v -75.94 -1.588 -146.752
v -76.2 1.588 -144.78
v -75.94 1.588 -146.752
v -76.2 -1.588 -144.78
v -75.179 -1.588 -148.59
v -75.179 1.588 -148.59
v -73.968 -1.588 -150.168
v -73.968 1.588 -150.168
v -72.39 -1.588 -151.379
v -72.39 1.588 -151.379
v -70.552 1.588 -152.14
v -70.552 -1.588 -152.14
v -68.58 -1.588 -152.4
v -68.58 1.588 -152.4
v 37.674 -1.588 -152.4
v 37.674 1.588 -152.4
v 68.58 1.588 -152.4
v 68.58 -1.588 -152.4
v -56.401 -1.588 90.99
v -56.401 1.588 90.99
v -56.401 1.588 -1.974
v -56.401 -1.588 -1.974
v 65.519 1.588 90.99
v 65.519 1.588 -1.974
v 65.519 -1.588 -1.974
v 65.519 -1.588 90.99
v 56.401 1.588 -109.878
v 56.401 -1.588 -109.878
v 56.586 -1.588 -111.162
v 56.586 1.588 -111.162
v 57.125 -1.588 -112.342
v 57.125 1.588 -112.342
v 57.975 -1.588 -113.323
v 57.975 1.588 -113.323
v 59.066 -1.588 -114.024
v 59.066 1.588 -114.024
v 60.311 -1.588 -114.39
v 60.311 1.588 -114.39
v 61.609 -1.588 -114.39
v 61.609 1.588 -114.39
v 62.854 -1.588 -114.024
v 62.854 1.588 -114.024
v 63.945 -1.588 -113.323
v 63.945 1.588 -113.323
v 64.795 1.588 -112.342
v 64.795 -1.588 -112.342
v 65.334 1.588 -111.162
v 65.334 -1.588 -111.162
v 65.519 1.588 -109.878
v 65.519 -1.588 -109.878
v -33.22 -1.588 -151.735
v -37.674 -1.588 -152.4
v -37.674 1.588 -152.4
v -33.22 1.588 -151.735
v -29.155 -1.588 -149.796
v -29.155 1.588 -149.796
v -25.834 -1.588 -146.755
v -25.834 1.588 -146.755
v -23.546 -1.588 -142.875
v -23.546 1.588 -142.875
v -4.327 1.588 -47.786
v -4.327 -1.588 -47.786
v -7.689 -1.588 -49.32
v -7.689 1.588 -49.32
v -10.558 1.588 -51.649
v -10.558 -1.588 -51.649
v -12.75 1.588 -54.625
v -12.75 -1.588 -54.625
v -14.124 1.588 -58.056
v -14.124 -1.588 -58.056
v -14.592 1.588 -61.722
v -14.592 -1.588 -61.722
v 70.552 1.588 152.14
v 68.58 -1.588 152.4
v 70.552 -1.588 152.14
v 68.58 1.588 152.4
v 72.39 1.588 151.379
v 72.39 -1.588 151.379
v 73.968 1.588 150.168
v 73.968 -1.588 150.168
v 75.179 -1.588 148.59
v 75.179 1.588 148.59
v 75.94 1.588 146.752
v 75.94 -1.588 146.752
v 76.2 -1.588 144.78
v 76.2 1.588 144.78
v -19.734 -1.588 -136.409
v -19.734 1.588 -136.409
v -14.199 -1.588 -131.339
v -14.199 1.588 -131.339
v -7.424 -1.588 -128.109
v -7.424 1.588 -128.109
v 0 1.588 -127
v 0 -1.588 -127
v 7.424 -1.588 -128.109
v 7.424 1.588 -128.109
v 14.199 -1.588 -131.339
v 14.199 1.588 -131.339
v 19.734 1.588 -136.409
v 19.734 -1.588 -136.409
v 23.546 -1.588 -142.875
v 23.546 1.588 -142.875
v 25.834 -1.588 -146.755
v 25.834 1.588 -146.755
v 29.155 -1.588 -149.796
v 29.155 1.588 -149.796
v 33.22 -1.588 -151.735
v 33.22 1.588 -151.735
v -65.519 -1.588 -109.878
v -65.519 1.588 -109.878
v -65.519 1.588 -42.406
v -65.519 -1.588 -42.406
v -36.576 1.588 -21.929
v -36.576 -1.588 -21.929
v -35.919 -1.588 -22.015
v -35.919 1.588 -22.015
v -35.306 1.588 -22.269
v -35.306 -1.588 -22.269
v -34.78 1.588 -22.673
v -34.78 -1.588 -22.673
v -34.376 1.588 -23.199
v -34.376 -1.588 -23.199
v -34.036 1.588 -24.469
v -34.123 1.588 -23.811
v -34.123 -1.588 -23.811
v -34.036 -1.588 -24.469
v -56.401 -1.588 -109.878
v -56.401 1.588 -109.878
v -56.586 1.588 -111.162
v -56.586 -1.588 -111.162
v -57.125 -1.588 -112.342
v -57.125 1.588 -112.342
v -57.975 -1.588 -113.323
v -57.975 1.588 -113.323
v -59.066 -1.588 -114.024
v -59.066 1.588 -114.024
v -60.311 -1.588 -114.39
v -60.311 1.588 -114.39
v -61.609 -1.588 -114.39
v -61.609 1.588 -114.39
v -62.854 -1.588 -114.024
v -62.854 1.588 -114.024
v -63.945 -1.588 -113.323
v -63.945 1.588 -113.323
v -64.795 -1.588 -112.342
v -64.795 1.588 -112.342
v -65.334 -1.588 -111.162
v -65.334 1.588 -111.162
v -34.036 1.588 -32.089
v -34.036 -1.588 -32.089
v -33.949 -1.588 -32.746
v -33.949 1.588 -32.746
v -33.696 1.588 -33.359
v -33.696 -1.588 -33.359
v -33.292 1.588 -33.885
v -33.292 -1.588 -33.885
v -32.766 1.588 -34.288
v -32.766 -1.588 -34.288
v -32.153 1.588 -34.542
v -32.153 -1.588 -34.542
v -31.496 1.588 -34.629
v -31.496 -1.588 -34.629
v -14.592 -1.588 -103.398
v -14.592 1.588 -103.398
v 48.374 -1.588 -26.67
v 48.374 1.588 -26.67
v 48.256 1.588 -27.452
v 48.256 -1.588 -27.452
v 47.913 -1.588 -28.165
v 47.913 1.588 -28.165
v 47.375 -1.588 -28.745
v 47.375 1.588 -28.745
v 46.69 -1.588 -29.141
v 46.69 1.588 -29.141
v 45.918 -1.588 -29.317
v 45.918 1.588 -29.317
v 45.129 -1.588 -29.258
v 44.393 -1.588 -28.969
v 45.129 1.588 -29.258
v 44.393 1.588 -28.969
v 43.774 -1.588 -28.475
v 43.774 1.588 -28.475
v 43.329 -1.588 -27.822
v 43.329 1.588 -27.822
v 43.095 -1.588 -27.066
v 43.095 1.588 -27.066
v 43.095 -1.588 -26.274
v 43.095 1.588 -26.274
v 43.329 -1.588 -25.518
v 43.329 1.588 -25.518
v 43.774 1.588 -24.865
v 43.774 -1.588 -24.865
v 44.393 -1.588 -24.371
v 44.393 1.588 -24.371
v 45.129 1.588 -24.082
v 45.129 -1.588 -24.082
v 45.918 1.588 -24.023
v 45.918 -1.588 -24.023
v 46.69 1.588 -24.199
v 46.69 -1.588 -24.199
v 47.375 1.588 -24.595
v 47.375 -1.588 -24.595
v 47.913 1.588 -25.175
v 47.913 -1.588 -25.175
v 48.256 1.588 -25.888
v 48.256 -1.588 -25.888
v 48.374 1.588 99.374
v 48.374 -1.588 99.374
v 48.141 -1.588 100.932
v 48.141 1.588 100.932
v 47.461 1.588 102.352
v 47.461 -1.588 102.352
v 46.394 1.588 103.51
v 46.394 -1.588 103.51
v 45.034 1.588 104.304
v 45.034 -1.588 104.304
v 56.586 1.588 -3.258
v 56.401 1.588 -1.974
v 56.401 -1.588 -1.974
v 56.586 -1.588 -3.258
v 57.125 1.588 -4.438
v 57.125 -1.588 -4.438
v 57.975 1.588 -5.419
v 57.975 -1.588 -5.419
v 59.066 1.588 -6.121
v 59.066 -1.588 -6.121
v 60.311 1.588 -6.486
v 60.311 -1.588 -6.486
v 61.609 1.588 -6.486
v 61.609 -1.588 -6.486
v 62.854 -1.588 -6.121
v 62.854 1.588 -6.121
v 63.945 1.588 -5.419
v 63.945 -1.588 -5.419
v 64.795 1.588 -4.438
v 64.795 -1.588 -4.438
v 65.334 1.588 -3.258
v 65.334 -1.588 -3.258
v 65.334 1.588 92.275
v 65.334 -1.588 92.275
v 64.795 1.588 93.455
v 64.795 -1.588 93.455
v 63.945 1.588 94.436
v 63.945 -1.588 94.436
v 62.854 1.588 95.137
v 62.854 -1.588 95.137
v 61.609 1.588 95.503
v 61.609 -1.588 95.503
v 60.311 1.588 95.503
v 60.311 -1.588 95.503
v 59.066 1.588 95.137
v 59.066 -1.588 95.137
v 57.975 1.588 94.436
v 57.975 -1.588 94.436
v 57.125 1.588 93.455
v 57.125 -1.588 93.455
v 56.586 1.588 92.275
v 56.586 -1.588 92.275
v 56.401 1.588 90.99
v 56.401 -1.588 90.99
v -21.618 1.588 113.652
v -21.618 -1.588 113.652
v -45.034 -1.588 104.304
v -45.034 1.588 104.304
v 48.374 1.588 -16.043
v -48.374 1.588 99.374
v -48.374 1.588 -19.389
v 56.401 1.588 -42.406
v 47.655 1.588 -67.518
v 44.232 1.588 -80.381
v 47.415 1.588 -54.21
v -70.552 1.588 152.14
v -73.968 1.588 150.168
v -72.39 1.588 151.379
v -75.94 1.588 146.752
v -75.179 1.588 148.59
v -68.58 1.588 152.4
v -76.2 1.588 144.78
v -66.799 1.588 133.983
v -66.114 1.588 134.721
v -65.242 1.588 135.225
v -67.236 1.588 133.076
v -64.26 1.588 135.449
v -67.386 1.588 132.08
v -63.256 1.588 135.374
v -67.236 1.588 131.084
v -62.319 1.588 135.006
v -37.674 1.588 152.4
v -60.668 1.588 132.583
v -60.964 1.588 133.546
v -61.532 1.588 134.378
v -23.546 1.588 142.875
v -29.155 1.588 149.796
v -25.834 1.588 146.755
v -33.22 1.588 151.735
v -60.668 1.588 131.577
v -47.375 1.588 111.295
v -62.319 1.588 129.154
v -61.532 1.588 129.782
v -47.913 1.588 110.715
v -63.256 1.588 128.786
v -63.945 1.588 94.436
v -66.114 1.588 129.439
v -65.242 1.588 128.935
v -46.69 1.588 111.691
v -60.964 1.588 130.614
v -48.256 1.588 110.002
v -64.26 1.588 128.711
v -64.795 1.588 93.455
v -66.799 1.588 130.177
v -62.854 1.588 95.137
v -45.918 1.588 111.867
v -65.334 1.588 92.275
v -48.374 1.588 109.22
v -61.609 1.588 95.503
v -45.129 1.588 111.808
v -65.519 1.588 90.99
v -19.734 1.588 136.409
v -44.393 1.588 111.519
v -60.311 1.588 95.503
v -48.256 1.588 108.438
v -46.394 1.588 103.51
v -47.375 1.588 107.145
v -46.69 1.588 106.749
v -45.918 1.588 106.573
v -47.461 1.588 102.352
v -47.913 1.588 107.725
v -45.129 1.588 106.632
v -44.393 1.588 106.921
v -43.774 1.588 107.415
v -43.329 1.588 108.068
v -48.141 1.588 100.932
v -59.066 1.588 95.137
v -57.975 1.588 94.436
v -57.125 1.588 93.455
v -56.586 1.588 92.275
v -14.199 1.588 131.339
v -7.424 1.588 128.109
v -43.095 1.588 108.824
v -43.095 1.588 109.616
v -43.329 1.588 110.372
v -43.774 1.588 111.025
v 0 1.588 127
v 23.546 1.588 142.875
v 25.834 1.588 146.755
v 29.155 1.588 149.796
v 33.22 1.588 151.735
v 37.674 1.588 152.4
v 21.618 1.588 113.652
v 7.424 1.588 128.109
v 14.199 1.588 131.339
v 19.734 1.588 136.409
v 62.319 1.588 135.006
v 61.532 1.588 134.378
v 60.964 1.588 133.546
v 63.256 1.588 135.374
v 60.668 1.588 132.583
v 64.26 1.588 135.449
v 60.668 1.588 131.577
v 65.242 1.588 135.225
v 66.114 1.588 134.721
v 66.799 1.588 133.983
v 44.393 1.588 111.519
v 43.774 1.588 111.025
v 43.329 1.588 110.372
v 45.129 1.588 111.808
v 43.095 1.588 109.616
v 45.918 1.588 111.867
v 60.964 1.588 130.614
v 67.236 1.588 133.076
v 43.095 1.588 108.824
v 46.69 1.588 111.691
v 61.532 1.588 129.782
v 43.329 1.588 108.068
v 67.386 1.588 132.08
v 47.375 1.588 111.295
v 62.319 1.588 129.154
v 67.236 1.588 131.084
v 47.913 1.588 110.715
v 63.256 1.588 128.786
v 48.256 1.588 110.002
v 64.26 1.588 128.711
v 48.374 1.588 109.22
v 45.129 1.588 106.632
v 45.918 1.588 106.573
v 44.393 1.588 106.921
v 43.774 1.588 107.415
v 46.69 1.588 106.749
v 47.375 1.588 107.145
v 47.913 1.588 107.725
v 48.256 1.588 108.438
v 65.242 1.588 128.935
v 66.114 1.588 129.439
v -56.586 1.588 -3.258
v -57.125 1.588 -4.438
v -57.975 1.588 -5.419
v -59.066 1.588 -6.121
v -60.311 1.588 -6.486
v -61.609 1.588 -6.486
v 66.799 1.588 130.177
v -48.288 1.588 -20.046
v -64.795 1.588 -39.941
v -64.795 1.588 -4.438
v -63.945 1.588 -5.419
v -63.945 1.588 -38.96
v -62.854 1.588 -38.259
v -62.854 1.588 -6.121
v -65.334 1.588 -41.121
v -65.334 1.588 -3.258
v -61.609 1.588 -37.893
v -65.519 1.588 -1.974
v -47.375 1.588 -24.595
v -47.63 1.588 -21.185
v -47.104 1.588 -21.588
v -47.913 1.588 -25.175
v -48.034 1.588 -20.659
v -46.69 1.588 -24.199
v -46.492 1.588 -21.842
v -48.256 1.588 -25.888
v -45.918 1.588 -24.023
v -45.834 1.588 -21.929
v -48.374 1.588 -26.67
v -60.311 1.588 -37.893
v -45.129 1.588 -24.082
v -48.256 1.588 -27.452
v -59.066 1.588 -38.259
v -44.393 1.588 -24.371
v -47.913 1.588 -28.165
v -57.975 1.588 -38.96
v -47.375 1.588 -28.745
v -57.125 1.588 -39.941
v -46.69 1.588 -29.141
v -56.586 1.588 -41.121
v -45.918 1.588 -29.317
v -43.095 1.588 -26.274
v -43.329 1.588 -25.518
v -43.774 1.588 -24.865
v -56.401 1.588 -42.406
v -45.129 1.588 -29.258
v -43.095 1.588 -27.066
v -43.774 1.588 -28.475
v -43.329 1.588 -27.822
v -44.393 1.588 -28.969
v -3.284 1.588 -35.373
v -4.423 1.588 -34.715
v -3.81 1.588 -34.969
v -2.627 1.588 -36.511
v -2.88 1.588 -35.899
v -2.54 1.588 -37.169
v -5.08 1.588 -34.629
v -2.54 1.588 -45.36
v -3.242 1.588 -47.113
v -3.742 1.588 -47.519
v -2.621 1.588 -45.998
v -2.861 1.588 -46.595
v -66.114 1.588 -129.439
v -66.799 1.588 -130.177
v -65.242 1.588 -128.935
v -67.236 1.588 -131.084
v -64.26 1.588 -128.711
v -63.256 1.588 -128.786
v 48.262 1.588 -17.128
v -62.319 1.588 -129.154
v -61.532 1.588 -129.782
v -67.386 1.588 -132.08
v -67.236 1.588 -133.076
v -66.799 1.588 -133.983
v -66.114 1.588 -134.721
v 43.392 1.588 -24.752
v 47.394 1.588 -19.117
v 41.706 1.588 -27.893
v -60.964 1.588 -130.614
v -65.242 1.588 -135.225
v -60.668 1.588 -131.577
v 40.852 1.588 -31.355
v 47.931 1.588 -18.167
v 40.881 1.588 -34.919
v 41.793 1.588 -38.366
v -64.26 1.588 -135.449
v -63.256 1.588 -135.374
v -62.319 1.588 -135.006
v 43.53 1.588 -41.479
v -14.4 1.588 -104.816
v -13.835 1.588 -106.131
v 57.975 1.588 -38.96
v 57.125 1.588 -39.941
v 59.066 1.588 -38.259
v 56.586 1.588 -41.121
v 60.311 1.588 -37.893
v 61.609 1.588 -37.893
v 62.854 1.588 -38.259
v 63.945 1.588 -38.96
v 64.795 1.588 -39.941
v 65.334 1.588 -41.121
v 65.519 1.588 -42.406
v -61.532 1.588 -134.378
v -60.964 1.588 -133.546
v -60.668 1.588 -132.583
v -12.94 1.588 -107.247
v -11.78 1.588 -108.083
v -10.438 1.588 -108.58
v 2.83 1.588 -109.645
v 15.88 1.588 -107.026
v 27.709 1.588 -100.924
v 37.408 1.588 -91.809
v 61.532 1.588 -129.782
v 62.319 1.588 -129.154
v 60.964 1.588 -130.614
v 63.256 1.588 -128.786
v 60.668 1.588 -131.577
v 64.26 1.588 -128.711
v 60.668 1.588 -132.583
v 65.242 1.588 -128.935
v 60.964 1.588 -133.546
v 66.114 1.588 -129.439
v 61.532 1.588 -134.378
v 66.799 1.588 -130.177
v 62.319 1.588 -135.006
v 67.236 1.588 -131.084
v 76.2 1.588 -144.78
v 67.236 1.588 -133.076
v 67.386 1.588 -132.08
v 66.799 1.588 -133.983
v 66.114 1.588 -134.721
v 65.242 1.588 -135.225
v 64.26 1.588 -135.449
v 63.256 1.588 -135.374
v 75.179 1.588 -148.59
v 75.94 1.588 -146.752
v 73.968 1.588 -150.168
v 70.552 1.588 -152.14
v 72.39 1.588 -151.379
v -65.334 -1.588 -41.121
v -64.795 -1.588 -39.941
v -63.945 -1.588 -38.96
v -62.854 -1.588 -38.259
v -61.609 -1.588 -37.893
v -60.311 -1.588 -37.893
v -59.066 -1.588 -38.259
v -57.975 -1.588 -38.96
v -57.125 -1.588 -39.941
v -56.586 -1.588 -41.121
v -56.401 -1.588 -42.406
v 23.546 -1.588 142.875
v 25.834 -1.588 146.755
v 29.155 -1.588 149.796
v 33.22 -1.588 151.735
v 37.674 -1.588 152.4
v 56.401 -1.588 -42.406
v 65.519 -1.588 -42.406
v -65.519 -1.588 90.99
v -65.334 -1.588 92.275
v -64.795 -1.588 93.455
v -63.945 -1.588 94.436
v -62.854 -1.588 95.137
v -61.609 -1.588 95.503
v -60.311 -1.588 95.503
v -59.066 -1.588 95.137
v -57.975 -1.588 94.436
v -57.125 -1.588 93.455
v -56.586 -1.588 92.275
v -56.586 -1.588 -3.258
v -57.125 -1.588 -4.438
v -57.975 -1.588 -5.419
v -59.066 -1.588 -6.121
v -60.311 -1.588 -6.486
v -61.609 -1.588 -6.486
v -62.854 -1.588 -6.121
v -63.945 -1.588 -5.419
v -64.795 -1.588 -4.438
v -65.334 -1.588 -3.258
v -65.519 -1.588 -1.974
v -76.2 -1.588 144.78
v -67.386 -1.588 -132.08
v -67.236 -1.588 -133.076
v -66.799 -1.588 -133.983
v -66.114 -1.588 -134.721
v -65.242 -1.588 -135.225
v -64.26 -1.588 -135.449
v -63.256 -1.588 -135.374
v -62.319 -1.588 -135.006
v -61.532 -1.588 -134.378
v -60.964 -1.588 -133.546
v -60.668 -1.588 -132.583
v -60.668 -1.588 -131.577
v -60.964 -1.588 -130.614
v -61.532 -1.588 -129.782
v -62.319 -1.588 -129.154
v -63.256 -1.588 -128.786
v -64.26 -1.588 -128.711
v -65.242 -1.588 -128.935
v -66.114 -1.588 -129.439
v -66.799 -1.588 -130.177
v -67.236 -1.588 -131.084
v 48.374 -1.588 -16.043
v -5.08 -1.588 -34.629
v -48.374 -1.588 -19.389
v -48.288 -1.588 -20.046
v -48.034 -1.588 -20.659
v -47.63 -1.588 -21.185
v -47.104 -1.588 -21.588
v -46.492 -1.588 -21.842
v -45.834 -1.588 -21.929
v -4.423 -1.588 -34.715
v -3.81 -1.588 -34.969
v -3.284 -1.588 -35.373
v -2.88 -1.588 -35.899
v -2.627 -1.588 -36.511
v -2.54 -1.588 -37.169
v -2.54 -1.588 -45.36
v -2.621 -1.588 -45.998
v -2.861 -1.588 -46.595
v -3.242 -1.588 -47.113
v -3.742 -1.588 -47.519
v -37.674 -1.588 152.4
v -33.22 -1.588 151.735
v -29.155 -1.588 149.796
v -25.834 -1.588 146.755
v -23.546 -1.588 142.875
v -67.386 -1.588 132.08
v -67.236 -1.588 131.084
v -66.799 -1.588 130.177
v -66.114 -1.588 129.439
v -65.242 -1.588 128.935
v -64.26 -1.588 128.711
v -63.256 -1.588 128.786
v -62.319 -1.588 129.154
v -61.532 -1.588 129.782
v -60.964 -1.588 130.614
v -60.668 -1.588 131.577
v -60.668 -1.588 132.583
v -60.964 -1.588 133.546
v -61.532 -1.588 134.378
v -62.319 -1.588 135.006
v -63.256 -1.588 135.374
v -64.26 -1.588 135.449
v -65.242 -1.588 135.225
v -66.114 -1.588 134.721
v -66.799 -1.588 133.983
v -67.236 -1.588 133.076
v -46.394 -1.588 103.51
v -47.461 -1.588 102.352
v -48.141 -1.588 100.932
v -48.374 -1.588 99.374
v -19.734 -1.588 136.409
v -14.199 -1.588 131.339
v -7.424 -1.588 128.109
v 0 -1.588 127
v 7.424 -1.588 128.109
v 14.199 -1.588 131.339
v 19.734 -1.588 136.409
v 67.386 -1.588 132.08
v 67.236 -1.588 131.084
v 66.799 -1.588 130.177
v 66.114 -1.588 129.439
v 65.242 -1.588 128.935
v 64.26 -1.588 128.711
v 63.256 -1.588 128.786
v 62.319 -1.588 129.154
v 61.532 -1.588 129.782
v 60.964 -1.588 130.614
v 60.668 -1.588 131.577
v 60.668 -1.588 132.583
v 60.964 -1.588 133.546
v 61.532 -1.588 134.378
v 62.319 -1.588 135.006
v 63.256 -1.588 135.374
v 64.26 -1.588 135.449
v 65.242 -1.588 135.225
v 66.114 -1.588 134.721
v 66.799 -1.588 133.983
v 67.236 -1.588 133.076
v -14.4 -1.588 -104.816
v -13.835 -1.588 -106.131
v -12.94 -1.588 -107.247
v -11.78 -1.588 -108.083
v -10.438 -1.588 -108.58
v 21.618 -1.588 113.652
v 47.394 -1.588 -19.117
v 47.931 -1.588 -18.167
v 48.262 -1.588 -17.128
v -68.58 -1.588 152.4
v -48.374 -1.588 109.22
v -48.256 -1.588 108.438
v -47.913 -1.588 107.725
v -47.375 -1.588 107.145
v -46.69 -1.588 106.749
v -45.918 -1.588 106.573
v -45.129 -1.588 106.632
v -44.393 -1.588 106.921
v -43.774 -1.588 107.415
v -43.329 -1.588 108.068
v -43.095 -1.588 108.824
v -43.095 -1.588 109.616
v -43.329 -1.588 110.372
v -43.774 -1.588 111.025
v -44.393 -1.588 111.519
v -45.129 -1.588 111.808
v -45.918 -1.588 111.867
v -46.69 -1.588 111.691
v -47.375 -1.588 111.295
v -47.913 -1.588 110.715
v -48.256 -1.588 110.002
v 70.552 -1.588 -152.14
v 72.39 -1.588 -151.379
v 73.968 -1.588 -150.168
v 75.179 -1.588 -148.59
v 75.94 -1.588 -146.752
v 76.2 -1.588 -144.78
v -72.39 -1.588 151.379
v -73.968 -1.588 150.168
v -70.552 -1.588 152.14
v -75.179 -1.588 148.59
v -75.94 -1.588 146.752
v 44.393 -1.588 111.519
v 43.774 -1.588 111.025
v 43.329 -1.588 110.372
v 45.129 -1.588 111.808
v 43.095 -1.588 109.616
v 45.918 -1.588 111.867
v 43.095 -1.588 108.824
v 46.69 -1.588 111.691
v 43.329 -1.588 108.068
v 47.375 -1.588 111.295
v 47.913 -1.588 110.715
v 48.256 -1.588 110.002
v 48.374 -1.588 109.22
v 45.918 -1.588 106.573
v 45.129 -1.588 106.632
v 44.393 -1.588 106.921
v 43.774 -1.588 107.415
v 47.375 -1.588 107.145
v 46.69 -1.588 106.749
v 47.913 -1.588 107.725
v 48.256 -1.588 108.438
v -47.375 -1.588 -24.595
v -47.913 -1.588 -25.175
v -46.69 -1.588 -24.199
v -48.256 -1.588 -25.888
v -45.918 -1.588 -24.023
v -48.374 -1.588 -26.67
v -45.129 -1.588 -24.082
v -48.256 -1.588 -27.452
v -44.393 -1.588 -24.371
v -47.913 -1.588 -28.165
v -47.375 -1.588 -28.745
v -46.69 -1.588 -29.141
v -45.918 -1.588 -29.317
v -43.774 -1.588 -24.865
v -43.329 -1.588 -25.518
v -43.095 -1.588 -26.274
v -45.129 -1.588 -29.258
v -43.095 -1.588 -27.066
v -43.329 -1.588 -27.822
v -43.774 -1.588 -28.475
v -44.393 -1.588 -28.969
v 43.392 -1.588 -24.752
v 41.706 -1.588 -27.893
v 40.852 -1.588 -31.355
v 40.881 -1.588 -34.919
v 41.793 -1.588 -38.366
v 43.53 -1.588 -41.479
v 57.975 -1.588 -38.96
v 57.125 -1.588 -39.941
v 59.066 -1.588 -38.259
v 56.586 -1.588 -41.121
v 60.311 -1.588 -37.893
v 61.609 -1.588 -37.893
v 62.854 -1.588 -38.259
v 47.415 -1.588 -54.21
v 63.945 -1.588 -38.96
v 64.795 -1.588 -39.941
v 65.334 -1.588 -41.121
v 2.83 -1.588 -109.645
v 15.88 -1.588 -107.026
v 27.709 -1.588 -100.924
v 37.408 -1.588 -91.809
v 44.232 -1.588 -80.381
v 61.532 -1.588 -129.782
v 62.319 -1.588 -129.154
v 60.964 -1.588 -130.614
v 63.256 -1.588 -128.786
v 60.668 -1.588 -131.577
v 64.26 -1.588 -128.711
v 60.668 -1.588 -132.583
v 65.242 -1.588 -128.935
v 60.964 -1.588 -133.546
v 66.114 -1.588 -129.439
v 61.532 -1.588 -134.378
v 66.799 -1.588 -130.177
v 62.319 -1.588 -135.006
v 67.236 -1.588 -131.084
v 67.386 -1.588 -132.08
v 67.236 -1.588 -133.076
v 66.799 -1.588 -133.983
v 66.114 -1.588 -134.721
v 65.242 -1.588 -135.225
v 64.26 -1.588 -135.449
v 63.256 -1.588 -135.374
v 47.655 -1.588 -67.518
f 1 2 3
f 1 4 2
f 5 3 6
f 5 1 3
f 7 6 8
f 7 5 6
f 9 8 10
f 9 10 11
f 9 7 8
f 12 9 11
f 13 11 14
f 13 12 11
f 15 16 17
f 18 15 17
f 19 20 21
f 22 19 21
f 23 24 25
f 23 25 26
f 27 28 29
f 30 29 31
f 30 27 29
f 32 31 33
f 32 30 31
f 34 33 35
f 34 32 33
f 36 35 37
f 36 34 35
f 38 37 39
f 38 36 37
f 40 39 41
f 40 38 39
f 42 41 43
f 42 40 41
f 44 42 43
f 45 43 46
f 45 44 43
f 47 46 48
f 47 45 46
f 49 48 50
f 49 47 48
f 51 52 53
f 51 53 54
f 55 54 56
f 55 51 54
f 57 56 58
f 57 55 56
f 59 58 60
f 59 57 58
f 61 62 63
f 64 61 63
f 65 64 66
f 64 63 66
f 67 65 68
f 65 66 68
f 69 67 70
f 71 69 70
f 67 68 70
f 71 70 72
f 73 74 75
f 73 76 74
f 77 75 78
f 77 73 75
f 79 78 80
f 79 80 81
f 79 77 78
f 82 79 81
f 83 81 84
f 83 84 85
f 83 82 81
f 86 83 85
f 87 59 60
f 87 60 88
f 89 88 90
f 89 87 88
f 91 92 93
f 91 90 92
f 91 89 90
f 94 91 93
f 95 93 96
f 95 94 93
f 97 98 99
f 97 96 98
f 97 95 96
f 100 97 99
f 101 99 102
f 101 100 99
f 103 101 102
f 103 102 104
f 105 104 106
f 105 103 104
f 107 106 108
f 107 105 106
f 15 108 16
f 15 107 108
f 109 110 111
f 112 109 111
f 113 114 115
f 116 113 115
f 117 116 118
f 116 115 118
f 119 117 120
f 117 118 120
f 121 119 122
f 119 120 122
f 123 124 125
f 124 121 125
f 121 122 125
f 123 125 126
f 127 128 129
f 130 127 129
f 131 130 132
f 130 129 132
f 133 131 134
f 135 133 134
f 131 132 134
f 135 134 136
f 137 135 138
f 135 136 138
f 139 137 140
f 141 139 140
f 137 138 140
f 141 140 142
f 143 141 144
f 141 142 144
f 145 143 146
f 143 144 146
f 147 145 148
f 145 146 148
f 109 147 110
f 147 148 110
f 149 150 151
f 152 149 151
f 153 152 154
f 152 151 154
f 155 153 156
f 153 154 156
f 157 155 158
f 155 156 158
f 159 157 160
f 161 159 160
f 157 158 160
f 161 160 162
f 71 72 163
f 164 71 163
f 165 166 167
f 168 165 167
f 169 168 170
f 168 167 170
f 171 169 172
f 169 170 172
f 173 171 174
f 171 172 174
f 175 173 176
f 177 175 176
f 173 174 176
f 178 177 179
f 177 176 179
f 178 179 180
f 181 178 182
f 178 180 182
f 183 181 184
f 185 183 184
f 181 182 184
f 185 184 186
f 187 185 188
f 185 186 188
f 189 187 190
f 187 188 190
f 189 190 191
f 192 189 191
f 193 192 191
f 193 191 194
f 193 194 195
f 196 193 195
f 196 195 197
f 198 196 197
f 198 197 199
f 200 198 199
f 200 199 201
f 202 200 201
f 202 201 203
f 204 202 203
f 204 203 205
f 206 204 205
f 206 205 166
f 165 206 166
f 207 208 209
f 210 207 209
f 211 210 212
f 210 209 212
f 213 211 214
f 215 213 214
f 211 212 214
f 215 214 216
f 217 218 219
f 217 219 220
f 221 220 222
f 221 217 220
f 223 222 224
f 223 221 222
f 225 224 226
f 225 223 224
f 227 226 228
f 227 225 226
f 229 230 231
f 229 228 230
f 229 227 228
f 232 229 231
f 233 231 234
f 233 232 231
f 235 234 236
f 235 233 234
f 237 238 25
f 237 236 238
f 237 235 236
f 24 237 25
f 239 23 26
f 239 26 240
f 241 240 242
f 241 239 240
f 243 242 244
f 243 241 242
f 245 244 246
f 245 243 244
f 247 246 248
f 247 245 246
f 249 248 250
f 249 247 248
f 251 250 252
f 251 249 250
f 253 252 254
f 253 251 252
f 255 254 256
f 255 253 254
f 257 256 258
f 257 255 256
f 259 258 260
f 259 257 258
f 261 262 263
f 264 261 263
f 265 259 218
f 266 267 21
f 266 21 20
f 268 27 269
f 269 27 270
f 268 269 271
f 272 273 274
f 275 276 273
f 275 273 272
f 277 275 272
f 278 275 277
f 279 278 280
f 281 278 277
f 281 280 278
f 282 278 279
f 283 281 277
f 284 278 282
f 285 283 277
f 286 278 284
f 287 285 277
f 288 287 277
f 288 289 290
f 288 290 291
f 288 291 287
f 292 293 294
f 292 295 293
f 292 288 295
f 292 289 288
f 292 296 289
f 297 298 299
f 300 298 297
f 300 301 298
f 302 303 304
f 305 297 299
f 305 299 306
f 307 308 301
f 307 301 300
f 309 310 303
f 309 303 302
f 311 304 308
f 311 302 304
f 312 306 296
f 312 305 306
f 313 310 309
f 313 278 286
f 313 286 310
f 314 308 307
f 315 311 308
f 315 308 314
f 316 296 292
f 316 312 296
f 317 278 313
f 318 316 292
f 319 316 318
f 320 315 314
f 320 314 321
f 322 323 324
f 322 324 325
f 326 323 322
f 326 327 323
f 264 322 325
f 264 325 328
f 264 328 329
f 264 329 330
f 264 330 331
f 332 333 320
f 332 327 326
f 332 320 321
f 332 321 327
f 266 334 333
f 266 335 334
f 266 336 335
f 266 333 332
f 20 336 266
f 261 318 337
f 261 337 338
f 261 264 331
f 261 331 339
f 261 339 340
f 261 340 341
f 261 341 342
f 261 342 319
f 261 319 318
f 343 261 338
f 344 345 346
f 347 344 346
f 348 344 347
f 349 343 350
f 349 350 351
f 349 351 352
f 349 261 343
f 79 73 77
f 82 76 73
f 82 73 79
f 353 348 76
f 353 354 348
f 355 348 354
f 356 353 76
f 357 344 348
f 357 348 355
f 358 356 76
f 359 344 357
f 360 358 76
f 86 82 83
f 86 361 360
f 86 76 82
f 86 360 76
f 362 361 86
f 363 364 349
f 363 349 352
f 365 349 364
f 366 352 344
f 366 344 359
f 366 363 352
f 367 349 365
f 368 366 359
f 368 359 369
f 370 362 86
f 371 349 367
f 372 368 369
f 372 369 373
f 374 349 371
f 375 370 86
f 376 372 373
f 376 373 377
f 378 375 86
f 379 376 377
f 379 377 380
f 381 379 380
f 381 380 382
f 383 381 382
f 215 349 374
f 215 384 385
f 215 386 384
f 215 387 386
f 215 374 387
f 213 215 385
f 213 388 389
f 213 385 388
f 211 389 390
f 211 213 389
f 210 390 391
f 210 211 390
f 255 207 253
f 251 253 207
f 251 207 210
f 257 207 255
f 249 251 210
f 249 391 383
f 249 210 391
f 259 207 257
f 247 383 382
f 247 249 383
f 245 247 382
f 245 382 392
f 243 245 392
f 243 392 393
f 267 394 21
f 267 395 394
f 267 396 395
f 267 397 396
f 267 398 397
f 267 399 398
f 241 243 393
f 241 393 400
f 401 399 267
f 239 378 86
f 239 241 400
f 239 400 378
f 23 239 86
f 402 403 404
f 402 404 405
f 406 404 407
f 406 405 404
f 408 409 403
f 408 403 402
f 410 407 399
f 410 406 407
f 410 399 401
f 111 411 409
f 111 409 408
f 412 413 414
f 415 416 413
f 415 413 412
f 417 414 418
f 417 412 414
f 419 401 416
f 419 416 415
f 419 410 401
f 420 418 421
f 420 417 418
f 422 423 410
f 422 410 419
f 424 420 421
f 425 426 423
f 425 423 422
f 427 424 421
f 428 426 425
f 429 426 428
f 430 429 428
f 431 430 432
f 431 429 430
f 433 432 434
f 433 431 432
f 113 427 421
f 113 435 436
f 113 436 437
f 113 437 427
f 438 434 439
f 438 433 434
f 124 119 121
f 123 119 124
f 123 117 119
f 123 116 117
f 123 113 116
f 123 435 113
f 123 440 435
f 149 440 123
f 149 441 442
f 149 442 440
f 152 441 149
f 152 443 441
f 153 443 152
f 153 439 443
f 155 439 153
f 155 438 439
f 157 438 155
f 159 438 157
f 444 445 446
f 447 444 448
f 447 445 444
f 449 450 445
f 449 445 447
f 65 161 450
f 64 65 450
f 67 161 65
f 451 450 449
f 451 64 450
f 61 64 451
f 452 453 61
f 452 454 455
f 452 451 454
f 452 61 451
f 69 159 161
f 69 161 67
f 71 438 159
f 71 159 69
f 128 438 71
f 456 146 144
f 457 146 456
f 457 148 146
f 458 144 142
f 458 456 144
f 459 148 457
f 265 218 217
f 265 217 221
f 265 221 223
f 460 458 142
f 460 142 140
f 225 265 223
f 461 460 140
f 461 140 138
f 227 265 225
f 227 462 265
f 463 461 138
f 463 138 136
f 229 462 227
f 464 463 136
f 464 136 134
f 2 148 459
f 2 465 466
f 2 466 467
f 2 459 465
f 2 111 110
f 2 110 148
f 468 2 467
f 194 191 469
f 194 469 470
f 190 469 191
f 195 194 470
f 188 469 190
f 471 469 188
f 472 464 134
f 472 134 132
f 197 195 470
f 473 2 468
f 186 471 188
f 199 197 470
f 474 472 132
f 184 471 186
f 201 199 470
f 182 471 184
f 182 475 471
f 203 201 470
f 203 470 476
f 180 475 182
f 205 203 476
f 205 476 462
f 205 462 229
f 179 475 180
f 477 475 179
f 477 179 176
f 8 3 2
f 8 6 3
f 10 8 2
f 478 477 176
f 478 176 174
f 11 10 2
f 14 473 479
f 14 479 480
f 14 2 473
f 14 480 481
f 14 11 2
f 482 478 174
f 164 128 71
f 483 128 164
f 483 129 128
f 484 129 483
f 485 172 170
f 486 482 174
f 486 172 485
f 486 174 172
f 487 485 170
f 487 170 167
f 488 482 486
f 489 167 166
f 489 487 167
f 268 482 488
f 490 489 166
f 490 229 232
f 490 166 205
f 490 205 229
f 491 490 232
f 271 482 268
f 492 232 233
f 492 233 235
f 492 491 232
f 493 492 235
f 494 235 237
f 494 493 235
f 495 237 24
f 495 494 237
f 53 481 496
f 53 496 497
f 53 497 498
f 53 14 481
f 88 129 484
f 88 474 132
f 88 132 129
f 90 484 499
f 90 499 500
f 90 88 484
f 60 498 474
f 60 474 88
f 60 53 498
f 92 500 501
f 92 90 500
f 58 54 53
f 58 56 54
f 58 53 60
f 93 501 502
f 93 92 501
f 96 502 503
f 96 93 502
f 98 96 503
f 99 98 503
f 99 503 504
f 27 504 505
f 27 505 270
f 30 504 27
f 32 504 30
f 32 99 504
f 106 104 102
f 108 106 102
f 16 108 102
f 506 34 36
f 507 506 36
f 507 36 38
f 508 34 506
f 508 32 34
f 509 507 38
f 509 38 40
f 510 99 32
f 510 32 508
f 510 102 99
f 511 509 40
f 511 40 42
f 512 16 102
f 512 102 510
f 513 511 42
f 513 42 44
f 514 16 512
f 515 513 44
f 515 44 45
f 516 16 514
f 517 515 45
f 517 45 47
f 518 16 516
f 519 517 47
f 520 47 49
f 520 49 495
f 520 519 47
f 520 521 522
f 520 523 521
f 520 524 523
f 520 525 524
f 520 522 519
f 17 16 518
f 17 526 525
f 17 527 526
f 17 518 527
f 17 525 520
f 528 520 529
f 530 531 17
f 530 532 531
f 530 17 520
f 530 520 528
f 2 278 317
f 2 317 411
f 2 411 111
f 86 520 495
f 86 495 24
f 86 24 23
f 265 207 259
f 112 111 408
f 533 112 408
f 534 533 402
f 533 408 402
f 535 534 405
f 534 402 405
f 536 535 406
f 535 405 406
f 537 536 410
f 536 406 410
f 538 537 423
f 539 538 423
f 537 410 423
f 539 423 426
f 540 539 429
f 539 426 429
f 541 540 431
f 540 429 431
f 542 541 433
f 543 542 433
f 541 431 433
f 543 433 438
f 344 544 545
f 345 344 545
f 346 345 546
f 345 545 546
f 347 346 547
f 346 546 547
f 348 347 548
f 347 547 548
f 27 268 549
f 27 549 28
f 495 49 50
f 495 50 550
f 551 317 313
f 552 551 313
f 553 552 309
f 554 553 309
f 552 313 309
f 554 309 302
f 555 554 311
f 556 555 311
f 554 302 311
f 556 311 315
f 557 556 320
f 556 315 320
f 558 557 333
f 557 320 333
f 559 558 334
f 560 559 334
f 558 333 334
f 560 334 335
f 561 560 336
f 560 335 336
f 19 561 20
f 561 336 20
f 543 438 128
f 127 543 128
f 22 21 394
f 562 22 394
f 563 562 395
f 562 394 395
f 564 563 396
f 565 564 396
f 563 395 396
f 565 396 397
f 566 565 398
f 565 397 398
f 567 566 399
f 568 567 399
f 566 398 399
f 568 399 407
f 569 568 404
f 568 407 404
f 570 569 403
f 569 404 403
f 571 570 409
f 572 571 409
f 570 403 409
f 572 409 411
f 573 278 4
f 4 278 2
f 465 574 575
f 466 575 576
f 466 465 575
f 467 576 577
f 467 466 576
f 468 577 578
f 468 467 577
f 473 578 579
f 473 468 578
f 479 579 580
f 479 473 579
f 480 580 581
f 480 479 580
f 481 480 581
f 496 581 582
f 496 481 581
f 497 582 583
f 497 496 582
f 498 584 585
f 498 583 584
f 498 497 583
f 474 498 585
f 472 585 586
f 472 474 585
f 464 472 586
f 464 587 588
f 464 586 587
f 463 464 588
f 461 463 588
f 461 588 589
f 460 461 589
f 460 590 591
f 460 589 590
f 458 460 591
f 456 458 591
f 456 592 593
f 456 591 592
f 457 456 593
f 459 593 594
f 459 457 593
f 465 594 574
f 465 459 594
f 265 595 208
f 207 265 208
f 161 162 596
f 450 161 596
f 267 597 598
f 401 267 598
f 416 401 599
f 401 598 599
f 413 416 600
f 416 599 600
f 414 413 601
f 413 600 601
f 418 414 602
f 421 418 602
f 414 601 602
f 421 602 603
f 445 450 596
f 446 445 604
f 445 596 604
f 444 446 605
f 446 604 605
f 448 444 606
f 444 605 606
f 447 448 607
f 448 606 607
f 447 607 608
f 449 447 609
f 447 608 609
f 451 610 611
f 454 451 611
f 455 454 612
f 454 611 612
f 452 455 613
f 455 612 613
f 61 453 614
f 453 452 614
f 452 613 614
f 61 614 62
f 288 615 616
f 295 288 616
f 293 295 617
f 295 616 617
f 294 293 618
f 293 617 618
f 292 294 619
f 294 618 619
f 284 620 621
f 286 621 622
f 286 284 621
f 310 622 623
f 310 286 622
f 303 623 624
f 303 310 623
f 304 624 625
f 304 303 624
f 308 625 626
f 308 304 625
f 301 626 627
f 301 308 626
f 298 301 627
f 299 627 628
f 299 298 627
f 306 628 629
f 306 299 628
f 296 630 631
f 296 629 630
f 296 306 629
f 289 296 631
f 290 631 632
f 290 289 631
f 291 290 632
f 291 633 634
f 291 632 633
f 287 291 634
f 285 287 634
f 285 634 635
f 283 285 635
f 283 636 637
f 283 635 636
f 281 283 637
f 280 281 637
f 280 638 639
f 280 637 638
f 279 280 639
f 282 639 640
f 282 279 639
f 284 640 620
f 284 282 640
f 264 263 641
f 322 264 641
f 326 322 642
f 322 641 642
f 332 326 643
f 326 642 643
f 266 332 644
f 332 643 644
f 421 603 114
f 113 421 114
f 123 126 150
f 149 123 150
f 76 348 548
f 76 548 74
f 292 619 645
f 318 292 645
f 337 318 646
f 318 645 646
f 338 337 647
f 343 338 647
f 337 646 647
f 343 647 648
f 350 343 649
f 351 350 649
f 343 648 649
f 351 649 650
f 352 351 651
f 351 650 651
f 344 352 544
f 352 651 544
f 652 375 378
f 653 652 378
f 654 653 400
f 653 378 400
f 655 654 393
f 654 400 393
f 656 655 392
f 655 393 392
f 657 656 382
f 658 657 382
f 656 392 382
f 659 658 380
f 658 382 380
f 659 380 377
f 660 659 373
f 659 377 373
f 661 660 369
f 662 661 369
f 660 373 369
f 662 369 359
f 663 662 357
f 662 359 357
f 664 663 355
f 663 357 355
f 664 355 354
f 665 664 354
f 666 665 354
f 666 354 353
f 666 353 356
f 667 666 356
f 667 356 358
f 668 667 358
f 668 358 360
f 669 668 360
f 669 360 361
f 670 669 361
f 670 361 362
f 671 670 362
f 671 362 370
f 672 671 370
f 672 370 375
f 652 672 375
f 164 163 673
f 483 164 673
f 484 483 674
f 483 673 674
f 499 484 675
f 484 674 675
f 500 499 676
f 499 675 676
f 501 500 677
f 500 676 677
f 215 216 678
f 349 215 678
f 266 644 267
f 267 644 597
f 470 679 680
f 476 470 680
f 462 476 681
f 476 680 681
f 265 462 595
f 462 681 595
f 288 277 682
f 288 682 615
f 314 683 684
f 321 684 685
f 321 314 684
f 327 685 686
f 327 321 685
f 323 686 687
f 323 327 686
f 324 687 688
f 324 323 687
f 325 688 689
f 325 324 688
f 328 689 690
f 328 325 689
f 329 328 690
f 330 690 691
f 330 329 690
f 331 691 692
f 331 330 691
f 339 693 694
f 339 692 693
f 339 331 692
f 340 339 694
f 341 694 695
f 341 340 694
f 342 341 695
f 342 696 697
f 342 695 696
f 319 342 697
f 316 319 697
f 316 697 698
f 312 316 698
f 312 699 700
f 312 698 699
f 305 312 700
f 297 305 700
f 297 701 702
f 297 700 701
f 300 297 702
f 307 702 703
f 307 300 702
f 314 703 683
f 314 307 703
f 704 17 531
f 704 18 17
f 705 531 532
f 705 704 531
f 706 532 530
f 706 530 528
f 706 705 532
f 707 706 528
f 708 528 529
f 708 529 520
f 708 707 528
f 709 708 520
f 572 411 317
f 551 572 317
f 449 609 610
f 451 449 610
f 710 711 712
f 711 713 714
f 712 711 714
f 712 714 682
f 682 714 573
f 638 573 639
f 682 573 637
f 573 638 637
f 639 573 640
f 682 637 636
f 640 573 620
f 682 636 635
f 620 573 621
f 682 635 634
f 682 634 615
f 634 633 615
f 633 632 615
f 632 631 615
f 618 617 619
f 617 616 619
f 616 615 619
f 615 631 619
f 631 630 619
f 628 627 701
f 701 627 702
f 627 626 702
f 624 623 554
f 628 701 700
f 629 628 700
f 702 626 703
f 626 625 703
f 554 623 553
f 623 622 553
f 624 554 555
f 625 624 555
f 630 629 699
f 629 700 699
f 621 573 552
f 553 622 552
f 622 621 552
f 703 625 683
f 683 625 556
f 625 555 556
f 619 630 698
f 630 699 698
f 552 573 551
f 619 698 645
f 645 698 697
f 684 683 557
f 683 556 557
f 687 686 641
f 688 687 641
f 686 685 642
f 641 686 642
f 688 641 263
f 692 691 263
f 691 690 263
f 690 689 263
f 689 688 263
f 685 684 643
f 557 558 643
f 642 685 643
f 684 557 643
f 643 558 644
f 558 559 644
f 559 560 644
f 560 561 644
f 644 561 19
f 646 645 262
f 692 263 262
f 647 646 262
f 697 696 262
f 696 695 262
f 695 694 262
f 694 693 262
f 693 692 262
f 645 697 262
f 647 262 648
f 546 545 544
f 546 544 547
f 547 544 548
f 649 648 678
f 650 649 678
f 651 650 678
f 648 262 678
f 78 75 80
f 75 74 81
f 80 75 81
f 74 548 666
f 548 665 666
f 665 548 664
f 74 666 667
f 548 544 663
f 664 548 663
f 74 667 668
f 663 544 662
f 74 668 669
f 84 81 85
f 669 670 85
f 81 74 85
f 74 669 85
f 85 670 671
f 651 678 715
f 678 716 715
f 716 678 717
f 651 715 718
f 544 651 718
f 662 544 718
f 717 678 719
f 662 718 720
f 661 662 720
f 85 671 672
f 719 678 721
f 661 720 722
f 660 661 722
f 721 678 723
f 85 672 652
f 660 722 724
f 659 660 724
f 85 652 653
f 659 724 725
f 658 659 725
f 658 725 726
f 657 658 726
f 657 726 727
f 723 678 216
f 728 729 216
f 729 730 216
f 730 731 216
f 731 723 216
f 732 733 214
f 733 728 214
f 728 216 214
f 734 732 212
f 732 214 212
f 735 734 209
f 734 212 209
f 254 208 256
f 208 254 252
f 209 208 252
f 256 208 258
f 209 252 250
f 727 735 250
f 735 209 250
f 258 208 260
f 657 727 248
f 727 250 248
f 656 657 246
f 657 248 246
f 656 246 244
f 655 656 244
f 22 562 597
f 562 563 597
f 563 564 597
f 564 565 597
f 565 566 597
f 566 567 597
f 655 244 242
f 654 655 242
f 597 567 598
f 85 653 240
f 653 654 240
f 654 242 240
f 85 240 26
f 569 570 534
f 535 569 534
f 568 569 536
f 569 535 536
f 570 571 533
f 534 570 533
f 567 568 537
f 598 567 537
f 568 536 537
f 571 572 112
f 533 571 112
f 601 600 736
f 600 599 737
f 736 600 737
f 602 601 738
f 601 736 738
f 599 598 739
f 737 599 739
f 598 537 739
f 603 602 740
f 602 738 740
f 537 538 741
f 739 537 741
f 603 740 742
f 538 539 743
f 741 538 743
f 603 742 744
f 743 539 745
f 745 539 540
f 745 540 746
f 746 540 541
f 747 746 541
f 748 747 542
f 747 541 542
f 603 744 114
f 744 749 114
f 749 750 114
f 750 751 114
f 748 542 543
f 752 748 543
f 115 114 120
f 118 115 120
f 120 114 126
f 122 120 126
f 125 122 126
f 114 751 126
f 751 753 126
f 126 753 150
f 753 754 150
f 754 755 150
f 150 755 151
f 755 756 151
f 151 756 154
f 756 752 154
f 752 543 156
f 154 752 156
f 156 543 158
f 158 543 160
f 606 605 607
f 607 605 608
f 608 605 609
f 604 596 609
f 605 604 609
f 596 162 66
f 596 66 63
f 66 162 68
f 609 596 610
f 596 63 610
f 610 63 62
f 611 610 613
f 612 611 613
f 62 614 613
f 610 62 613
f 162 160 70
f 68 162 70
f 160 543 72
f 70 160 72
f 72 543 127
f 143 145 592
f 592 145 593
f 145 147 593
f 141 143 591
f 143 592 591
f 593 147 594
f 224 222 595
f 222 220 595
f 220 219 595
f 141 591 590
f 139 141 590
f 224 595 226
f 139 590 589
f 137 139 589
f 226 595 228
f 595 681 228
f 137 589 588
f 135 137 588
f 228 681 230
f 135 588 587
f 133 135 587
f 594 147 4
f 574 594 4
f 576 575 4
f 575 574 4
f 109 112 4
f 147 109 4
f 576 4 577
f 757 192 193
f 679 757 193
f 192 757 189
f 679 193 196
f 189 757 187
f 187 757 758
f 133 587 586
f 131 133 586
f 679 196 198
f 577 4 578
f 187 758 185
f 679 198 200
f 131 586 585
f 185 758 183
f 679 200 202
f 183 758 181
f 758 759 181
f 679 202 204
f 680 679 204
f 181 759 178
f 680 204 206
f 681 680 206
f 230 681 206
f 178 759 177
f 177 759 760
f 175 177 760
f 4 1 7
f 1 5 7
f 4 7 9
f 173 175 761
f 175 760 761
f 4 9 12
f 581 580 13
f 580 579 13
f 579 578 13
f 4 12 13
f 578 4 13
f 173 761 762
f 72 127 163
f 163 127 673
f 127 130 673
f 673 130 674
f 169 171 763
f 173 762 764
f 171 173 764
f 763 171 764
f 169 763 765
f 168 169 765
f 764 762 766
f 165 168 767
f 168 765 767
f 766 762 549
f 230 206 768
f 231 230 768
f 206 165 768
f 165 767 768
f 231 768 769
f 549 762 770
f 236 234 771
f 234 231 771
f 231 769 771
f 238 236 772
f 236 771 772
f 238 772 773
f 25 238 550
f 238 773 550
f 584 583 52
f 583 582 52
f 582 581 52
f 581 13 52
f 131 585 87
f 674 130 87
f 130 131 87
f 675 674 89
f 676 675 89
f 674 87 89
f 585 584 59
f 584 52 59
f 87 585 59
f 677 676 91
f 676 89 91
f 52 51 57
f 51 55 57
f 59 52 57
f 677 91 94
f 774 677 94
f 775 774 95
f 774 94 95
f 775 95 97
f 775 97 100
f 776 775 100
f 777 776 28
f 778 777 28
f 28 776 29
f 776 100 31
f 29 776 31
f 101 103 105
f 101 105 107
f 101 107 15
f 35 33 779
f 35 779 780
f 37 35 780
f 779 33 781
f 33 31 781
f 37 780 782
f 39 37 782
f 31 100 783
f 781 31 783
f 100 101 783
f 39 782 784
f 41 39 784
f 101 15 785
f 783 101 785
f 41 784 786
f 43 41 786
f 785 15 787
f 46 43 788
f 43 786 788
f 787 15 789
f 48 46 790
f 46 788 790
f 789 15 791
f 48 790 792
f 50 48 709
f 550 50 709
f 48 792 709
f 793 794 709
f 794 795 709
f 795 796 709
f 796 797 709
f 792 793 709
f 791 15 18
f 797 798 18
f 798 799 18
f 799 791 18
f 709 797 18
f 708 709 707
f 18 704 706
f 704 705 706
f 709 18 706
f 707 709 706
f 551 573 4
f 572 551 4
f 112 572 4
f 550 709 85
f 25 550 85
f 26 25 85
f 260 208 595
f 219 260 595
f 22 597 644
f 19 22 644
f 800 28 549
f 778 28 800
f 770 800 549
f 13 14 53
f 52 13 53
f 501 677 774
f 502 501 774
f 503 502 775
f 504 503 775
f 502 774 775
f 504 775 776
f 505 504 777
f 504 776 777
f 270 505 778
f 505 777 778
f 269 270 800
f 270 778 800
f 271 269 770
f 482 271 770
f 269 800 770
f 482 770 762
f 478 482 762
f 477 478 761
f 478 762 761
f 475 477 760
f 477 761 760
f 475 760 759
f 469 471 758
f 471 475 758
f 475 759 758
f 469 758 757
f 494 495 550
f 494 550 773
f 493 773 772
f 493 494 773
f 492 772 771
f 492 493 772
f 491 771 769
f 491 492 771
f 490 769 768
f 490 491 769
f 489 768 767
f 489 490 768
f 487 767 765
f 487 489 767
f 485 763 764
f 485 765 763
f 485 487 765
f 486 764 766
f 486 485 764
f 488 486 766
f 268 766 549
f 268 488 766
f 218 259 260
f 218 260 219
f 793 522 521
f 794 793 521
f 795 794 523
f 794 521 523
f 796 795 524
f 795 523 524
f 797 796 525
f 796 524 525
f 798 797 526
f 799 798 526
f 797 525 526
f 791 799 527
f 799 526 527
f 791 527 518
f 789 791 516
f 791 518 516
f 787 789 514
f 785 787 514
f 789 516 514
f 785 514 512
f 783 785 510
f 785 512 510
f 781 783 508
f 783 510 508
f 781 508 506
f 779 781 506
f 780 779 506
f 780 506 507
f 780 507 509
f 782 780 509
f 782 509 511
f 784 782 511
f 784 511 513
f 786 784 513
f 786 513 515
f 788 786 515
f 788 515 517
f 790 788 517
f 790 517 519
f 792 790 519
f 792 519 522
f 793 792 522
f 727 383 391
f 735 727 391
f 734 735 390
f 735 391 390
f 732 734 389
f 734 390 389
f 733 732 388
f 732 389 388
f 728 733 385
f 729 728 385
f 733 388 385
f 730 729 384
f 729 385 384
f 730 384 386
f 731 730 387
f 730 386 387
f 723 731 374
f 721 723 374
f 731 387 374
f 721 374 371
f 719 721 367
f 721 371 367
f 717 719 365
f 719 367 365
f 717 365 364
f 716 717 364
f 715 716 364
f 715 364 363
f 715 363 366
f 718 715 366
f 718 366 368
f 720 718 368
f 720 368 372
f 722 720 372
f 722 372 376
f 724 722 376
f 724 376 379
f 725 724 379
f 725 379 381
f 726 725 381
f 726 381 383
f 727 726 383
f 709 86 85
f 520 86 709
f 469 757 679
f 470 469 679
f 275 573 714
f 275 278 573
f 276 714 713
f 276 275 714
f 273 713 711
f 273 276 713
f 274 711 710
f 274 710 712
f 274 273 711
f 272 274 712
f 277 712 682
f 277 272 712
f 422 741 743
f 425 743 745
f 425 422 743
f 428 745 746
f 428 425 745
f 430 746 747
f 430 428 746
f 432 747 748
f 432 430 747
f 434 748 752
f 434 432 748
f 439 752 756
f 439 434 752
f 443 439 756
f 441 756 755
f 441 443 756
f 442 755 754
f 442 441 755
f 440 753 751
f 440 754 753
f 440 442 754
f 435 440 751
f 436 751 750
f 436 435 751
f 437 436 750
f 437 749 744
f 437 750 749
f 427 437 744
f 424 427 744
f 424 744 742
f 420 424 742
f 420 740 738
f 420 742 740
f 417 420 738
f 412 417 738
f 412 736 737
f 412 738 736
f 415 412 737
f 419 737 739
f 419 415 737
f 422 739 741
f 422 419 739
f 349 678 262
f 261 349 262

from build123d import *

# Parameters (mm, degrees)
SKETCH1_W           = 152.4
SKETCH1_H           = 304.8
BOSS_EXTRUDE1_DEPTH = 1.5875
SKETCH3_R           = 2.6543
SKETCH3_R_2         = 3.3782
CUT_EXTRUDE1_DEPTH  = 4.175
FILLET1_R           = 7.62
CUT_EXTRUDE2_START  = -4.175
CUT_EXTRUDE2_DEPTH  = 5.175
CUT_EXTRUDE3_DEPTH  = 4.175
CUT_EXTRUDE4_DEPTH  = 4.175


with BuildPart() as part:
    # Sketch1 → Boss-Extrude1 (new body, symmetric)
    with BuildSketch(Plane(origin=(0, 0, 0), x_dir=(1, 0, 0), z_dir=(0, 1, 0))):
        Rectangle(SKETCH1_W, SKETCH1_H)
    extrude(amount=BOSS_EXTRUDE1_DEPTH, both=True)

    # Sketch3 → Cut-Extrude1 (cut, through all)
    with BuildSketch(Plane(origin=(0, 1.5875, 0), x_dir=(1, 0, 0), z_dir=(0, 1, 0))):
        with Locations((45.72, -109.22)):
            Circle(SKETCH3_R)
        with Locations((45.72, 26.67)):
            Circle(SKETCH3_R)
        with Locations((64.008, 132.08)):
            Circle(SKETCH3_R_2)
        with Locations((64.008, -132.08)):
            Circle(SKETCH3_R_2)
    cut_extrude1 = extrude(amount=-CUT_EXTRUDE1_DEPTH, mode=Mode.SUBTRACT)

    # Mirror1: Cut-Extrude1 across plane
    add(cut_extrude1.mirror(Plane(origin=(0, 0, 0), x_dir=(0, 0, 1), z_dir=(1, 0, 0))), mode=Mode.SUBTRACT)

    # Fillet1
    fillet1_edges = [part.edges().sort_by_distance(p)[0] for p in [
        (76.2, 0, 152.4),
        (-76.2, 0, 152.4),
        (-76.2, 0, -152.4),
        (76.2, 0, -152.4),
    ]]
    fillet(fillet1_edges, radius=FILLET1_R)

    # Sketch4 → Cut-Extrude2 (cut)
    with BuildSketch(Plane(origin=(0, 1.5875, 0), x_dir=(1, 0, 0), z_dir=(0, 1, 0)).offset(CUT_EXTRUDE2_START)):
        with BuildLine():
            Line((-753.455657881, 152.4), (-68.58, 152.4))
            Line((-68.58, 152.4), (-37.674288314, 152.4))
            ThreePointArc((-37.674288314, 152.4), (-29.15486932, 149.796340451), (-23.546430197, 142.875))
            ThreePointArc((-23.546430197, 142.875), (0, 127), (23.546430197, 142.875))
            ThreePointArc((23.546430197, 142.875), (29.15486932, 149.796340451), (37.674288314, 152.4))
            Line((37.674288314, 152.4), (68.58, 152.4))
            Line((68.58, 152.4), (753.455657881, 152.4))
            Line((753.455657881, 152.4), (753.455657881, 1522.151315762))
            Line((753.455657881, 1522.151315762), (-753.455657881, 1522.151315762))
            Line((-753.455657881, 1522.151315762), (-753.455657881, 152.4))
        make_face()
    cut_extrude2 = extrude(amount=CUT_EXTRUDE2_DEPTH, mode=Mode.SUBTRACT)

    # Mirror2: Cut-Extrude2 across plane
    add(cut_extrude2.mirror(Plane.XY), mode=Mode.SUBTRACT)

    # Sketch7 → Cut-Extrude3 (cut, through all)
    with BuildSketch(Plane(origin=(0, 1.5875, 0), x_dir=(1, 0, 0), z_dir=(0, 1, 0))):
        with BuildLine():
            Line((65.518901805, 109.877508821), (65.518901805, 42.4057621))
            ThreePointArc((65.518901805, 42.4057621), (60.96, 37.846860295), (56.401098195, 42.4057621))
            Line((56.401098195, 42.4057621), (56.401098195, 109.877508821))
            ThreePointArc((56.401098195, 109.877508821), (60.96, 114.436410627), (65.518901805, 109.877508821))
        make_face()
        with BuildLine():
            Line((65.518901805, 1.973635461), (65.518901805, -90.990364539))
            ThreePointArc((65.518901805, -90.990364539), (60.96, -95.549266345), (56.401098195, -90.990364539))
            Line((56.401098195, -90.990364539), (56.401098195, 1.973635461))
            ThreePointArc((56.401098195, 1.973635461), (60.96, 6.532537266), (65.518901805, 1.973635461))
        make_face()
    cut_extrude3 = extrude(amount=-CUT_EXTRUDE3_DEPTH, mode=Mode.SUBTRACT)

    # Mirror3: Cut-Extrude3 across plane
    add(cut_extrude3.mirror(Plane(origin=(0, 0, 0), x_dir=(0, 0, 1), z_dir=(1, 0, 0))), mode=Mode.SUBTRACT)

    # Sketch9 → Cut-Extrude4 (cut, through all)
    with BuildSketch(Plane.XZ.offset(1.5875)):
        with BuildLine():
            Line((-14.5923, -61.722), (-14.5923, -103.398249639))
            ThreePointArc((-14.5923, -103.398249639), (-13.42547703, -106.718929839), (-10.437940285, -108.579848169))
            ThreePointArc((-10.437940285, -108.579848169), (37.40844001, -91.808826826), (43.529723769, -41.479181989))
            ThreePointArc((43.529723769, -41.479181989), (40.754786716, -33.137895831), (43.391609306, -24.751925581))
            Line((43.391609306, -24.751925581), (47.393812046, -19.116690889))
            ThreePointArc((47.393812046, -19.116690889), (48.123241377, -17.656049777), (48.3743, -16.042820352))
            Line((48.3743, -16.042820352), (48.3743, 99.374229362))
            ThreePointArc((48.3743, 99.374229362), (47.460552946, 102.351896493), (45.03387068, 104.304496914))
            Line((45.03387068, 104.304496914), (21.617623949, 113.6523))
            Line((21.617623949, 113.6523), (-21.617623949, 113.6523))
            Line((-21.617623949, 113.6523), (-45.03387068, 104.304496914))
            ThreePointArc((-45.03387068, 104.304496914), (-47.460552946, 102.351896493), (-48.3743, 99.374229362))
            Line((-48.3743, 99.374229362), (-48.3743, -19.388666667))
            ThreePointArc((-48.3743, -19.388666667), (-47.630351224, -21.184717891), (-45.8343, -21.928666667))
            Line((-45.8343, -21.928666667), (-36.576, -21.928666667))
            ThreePointArc((-36.576, -21.928666667), (-34.779948776, -22.672615442), (-34.036, -24.468666667))
            Line((-34.036, -24.468666667), (-34.036, -32.088666667))
            ThreePointArc((-34.036, -32.088666667), (-33.292051224, -33.884717891), (-31.496, -34.628666667))
            Line((-31.496, -34.628666667), (-5.08, -34.628666667))
            ThreePointArc((-5.08, -34.628666667), (-3.283948776, -35.372615442), (-2.54, -37.168666667))
            Line((-2.54, -37.168666667), (-2.54, -45.360175429))
            ThreePointArc((-2.54, -45.360175429), (-3.034932492, -46.866594656), (-4.326849518, -47.785946307))
            ThreePointArc((-4.326849518, -47.785946307), (-11.748912833, -53.06762154), (-14.5923, -61.722))
        make_face()
    extrude(amount=-CUT_EXTRUDE4_DEPTH, mode=Mode.SUBTRACT)


solid = part.part
